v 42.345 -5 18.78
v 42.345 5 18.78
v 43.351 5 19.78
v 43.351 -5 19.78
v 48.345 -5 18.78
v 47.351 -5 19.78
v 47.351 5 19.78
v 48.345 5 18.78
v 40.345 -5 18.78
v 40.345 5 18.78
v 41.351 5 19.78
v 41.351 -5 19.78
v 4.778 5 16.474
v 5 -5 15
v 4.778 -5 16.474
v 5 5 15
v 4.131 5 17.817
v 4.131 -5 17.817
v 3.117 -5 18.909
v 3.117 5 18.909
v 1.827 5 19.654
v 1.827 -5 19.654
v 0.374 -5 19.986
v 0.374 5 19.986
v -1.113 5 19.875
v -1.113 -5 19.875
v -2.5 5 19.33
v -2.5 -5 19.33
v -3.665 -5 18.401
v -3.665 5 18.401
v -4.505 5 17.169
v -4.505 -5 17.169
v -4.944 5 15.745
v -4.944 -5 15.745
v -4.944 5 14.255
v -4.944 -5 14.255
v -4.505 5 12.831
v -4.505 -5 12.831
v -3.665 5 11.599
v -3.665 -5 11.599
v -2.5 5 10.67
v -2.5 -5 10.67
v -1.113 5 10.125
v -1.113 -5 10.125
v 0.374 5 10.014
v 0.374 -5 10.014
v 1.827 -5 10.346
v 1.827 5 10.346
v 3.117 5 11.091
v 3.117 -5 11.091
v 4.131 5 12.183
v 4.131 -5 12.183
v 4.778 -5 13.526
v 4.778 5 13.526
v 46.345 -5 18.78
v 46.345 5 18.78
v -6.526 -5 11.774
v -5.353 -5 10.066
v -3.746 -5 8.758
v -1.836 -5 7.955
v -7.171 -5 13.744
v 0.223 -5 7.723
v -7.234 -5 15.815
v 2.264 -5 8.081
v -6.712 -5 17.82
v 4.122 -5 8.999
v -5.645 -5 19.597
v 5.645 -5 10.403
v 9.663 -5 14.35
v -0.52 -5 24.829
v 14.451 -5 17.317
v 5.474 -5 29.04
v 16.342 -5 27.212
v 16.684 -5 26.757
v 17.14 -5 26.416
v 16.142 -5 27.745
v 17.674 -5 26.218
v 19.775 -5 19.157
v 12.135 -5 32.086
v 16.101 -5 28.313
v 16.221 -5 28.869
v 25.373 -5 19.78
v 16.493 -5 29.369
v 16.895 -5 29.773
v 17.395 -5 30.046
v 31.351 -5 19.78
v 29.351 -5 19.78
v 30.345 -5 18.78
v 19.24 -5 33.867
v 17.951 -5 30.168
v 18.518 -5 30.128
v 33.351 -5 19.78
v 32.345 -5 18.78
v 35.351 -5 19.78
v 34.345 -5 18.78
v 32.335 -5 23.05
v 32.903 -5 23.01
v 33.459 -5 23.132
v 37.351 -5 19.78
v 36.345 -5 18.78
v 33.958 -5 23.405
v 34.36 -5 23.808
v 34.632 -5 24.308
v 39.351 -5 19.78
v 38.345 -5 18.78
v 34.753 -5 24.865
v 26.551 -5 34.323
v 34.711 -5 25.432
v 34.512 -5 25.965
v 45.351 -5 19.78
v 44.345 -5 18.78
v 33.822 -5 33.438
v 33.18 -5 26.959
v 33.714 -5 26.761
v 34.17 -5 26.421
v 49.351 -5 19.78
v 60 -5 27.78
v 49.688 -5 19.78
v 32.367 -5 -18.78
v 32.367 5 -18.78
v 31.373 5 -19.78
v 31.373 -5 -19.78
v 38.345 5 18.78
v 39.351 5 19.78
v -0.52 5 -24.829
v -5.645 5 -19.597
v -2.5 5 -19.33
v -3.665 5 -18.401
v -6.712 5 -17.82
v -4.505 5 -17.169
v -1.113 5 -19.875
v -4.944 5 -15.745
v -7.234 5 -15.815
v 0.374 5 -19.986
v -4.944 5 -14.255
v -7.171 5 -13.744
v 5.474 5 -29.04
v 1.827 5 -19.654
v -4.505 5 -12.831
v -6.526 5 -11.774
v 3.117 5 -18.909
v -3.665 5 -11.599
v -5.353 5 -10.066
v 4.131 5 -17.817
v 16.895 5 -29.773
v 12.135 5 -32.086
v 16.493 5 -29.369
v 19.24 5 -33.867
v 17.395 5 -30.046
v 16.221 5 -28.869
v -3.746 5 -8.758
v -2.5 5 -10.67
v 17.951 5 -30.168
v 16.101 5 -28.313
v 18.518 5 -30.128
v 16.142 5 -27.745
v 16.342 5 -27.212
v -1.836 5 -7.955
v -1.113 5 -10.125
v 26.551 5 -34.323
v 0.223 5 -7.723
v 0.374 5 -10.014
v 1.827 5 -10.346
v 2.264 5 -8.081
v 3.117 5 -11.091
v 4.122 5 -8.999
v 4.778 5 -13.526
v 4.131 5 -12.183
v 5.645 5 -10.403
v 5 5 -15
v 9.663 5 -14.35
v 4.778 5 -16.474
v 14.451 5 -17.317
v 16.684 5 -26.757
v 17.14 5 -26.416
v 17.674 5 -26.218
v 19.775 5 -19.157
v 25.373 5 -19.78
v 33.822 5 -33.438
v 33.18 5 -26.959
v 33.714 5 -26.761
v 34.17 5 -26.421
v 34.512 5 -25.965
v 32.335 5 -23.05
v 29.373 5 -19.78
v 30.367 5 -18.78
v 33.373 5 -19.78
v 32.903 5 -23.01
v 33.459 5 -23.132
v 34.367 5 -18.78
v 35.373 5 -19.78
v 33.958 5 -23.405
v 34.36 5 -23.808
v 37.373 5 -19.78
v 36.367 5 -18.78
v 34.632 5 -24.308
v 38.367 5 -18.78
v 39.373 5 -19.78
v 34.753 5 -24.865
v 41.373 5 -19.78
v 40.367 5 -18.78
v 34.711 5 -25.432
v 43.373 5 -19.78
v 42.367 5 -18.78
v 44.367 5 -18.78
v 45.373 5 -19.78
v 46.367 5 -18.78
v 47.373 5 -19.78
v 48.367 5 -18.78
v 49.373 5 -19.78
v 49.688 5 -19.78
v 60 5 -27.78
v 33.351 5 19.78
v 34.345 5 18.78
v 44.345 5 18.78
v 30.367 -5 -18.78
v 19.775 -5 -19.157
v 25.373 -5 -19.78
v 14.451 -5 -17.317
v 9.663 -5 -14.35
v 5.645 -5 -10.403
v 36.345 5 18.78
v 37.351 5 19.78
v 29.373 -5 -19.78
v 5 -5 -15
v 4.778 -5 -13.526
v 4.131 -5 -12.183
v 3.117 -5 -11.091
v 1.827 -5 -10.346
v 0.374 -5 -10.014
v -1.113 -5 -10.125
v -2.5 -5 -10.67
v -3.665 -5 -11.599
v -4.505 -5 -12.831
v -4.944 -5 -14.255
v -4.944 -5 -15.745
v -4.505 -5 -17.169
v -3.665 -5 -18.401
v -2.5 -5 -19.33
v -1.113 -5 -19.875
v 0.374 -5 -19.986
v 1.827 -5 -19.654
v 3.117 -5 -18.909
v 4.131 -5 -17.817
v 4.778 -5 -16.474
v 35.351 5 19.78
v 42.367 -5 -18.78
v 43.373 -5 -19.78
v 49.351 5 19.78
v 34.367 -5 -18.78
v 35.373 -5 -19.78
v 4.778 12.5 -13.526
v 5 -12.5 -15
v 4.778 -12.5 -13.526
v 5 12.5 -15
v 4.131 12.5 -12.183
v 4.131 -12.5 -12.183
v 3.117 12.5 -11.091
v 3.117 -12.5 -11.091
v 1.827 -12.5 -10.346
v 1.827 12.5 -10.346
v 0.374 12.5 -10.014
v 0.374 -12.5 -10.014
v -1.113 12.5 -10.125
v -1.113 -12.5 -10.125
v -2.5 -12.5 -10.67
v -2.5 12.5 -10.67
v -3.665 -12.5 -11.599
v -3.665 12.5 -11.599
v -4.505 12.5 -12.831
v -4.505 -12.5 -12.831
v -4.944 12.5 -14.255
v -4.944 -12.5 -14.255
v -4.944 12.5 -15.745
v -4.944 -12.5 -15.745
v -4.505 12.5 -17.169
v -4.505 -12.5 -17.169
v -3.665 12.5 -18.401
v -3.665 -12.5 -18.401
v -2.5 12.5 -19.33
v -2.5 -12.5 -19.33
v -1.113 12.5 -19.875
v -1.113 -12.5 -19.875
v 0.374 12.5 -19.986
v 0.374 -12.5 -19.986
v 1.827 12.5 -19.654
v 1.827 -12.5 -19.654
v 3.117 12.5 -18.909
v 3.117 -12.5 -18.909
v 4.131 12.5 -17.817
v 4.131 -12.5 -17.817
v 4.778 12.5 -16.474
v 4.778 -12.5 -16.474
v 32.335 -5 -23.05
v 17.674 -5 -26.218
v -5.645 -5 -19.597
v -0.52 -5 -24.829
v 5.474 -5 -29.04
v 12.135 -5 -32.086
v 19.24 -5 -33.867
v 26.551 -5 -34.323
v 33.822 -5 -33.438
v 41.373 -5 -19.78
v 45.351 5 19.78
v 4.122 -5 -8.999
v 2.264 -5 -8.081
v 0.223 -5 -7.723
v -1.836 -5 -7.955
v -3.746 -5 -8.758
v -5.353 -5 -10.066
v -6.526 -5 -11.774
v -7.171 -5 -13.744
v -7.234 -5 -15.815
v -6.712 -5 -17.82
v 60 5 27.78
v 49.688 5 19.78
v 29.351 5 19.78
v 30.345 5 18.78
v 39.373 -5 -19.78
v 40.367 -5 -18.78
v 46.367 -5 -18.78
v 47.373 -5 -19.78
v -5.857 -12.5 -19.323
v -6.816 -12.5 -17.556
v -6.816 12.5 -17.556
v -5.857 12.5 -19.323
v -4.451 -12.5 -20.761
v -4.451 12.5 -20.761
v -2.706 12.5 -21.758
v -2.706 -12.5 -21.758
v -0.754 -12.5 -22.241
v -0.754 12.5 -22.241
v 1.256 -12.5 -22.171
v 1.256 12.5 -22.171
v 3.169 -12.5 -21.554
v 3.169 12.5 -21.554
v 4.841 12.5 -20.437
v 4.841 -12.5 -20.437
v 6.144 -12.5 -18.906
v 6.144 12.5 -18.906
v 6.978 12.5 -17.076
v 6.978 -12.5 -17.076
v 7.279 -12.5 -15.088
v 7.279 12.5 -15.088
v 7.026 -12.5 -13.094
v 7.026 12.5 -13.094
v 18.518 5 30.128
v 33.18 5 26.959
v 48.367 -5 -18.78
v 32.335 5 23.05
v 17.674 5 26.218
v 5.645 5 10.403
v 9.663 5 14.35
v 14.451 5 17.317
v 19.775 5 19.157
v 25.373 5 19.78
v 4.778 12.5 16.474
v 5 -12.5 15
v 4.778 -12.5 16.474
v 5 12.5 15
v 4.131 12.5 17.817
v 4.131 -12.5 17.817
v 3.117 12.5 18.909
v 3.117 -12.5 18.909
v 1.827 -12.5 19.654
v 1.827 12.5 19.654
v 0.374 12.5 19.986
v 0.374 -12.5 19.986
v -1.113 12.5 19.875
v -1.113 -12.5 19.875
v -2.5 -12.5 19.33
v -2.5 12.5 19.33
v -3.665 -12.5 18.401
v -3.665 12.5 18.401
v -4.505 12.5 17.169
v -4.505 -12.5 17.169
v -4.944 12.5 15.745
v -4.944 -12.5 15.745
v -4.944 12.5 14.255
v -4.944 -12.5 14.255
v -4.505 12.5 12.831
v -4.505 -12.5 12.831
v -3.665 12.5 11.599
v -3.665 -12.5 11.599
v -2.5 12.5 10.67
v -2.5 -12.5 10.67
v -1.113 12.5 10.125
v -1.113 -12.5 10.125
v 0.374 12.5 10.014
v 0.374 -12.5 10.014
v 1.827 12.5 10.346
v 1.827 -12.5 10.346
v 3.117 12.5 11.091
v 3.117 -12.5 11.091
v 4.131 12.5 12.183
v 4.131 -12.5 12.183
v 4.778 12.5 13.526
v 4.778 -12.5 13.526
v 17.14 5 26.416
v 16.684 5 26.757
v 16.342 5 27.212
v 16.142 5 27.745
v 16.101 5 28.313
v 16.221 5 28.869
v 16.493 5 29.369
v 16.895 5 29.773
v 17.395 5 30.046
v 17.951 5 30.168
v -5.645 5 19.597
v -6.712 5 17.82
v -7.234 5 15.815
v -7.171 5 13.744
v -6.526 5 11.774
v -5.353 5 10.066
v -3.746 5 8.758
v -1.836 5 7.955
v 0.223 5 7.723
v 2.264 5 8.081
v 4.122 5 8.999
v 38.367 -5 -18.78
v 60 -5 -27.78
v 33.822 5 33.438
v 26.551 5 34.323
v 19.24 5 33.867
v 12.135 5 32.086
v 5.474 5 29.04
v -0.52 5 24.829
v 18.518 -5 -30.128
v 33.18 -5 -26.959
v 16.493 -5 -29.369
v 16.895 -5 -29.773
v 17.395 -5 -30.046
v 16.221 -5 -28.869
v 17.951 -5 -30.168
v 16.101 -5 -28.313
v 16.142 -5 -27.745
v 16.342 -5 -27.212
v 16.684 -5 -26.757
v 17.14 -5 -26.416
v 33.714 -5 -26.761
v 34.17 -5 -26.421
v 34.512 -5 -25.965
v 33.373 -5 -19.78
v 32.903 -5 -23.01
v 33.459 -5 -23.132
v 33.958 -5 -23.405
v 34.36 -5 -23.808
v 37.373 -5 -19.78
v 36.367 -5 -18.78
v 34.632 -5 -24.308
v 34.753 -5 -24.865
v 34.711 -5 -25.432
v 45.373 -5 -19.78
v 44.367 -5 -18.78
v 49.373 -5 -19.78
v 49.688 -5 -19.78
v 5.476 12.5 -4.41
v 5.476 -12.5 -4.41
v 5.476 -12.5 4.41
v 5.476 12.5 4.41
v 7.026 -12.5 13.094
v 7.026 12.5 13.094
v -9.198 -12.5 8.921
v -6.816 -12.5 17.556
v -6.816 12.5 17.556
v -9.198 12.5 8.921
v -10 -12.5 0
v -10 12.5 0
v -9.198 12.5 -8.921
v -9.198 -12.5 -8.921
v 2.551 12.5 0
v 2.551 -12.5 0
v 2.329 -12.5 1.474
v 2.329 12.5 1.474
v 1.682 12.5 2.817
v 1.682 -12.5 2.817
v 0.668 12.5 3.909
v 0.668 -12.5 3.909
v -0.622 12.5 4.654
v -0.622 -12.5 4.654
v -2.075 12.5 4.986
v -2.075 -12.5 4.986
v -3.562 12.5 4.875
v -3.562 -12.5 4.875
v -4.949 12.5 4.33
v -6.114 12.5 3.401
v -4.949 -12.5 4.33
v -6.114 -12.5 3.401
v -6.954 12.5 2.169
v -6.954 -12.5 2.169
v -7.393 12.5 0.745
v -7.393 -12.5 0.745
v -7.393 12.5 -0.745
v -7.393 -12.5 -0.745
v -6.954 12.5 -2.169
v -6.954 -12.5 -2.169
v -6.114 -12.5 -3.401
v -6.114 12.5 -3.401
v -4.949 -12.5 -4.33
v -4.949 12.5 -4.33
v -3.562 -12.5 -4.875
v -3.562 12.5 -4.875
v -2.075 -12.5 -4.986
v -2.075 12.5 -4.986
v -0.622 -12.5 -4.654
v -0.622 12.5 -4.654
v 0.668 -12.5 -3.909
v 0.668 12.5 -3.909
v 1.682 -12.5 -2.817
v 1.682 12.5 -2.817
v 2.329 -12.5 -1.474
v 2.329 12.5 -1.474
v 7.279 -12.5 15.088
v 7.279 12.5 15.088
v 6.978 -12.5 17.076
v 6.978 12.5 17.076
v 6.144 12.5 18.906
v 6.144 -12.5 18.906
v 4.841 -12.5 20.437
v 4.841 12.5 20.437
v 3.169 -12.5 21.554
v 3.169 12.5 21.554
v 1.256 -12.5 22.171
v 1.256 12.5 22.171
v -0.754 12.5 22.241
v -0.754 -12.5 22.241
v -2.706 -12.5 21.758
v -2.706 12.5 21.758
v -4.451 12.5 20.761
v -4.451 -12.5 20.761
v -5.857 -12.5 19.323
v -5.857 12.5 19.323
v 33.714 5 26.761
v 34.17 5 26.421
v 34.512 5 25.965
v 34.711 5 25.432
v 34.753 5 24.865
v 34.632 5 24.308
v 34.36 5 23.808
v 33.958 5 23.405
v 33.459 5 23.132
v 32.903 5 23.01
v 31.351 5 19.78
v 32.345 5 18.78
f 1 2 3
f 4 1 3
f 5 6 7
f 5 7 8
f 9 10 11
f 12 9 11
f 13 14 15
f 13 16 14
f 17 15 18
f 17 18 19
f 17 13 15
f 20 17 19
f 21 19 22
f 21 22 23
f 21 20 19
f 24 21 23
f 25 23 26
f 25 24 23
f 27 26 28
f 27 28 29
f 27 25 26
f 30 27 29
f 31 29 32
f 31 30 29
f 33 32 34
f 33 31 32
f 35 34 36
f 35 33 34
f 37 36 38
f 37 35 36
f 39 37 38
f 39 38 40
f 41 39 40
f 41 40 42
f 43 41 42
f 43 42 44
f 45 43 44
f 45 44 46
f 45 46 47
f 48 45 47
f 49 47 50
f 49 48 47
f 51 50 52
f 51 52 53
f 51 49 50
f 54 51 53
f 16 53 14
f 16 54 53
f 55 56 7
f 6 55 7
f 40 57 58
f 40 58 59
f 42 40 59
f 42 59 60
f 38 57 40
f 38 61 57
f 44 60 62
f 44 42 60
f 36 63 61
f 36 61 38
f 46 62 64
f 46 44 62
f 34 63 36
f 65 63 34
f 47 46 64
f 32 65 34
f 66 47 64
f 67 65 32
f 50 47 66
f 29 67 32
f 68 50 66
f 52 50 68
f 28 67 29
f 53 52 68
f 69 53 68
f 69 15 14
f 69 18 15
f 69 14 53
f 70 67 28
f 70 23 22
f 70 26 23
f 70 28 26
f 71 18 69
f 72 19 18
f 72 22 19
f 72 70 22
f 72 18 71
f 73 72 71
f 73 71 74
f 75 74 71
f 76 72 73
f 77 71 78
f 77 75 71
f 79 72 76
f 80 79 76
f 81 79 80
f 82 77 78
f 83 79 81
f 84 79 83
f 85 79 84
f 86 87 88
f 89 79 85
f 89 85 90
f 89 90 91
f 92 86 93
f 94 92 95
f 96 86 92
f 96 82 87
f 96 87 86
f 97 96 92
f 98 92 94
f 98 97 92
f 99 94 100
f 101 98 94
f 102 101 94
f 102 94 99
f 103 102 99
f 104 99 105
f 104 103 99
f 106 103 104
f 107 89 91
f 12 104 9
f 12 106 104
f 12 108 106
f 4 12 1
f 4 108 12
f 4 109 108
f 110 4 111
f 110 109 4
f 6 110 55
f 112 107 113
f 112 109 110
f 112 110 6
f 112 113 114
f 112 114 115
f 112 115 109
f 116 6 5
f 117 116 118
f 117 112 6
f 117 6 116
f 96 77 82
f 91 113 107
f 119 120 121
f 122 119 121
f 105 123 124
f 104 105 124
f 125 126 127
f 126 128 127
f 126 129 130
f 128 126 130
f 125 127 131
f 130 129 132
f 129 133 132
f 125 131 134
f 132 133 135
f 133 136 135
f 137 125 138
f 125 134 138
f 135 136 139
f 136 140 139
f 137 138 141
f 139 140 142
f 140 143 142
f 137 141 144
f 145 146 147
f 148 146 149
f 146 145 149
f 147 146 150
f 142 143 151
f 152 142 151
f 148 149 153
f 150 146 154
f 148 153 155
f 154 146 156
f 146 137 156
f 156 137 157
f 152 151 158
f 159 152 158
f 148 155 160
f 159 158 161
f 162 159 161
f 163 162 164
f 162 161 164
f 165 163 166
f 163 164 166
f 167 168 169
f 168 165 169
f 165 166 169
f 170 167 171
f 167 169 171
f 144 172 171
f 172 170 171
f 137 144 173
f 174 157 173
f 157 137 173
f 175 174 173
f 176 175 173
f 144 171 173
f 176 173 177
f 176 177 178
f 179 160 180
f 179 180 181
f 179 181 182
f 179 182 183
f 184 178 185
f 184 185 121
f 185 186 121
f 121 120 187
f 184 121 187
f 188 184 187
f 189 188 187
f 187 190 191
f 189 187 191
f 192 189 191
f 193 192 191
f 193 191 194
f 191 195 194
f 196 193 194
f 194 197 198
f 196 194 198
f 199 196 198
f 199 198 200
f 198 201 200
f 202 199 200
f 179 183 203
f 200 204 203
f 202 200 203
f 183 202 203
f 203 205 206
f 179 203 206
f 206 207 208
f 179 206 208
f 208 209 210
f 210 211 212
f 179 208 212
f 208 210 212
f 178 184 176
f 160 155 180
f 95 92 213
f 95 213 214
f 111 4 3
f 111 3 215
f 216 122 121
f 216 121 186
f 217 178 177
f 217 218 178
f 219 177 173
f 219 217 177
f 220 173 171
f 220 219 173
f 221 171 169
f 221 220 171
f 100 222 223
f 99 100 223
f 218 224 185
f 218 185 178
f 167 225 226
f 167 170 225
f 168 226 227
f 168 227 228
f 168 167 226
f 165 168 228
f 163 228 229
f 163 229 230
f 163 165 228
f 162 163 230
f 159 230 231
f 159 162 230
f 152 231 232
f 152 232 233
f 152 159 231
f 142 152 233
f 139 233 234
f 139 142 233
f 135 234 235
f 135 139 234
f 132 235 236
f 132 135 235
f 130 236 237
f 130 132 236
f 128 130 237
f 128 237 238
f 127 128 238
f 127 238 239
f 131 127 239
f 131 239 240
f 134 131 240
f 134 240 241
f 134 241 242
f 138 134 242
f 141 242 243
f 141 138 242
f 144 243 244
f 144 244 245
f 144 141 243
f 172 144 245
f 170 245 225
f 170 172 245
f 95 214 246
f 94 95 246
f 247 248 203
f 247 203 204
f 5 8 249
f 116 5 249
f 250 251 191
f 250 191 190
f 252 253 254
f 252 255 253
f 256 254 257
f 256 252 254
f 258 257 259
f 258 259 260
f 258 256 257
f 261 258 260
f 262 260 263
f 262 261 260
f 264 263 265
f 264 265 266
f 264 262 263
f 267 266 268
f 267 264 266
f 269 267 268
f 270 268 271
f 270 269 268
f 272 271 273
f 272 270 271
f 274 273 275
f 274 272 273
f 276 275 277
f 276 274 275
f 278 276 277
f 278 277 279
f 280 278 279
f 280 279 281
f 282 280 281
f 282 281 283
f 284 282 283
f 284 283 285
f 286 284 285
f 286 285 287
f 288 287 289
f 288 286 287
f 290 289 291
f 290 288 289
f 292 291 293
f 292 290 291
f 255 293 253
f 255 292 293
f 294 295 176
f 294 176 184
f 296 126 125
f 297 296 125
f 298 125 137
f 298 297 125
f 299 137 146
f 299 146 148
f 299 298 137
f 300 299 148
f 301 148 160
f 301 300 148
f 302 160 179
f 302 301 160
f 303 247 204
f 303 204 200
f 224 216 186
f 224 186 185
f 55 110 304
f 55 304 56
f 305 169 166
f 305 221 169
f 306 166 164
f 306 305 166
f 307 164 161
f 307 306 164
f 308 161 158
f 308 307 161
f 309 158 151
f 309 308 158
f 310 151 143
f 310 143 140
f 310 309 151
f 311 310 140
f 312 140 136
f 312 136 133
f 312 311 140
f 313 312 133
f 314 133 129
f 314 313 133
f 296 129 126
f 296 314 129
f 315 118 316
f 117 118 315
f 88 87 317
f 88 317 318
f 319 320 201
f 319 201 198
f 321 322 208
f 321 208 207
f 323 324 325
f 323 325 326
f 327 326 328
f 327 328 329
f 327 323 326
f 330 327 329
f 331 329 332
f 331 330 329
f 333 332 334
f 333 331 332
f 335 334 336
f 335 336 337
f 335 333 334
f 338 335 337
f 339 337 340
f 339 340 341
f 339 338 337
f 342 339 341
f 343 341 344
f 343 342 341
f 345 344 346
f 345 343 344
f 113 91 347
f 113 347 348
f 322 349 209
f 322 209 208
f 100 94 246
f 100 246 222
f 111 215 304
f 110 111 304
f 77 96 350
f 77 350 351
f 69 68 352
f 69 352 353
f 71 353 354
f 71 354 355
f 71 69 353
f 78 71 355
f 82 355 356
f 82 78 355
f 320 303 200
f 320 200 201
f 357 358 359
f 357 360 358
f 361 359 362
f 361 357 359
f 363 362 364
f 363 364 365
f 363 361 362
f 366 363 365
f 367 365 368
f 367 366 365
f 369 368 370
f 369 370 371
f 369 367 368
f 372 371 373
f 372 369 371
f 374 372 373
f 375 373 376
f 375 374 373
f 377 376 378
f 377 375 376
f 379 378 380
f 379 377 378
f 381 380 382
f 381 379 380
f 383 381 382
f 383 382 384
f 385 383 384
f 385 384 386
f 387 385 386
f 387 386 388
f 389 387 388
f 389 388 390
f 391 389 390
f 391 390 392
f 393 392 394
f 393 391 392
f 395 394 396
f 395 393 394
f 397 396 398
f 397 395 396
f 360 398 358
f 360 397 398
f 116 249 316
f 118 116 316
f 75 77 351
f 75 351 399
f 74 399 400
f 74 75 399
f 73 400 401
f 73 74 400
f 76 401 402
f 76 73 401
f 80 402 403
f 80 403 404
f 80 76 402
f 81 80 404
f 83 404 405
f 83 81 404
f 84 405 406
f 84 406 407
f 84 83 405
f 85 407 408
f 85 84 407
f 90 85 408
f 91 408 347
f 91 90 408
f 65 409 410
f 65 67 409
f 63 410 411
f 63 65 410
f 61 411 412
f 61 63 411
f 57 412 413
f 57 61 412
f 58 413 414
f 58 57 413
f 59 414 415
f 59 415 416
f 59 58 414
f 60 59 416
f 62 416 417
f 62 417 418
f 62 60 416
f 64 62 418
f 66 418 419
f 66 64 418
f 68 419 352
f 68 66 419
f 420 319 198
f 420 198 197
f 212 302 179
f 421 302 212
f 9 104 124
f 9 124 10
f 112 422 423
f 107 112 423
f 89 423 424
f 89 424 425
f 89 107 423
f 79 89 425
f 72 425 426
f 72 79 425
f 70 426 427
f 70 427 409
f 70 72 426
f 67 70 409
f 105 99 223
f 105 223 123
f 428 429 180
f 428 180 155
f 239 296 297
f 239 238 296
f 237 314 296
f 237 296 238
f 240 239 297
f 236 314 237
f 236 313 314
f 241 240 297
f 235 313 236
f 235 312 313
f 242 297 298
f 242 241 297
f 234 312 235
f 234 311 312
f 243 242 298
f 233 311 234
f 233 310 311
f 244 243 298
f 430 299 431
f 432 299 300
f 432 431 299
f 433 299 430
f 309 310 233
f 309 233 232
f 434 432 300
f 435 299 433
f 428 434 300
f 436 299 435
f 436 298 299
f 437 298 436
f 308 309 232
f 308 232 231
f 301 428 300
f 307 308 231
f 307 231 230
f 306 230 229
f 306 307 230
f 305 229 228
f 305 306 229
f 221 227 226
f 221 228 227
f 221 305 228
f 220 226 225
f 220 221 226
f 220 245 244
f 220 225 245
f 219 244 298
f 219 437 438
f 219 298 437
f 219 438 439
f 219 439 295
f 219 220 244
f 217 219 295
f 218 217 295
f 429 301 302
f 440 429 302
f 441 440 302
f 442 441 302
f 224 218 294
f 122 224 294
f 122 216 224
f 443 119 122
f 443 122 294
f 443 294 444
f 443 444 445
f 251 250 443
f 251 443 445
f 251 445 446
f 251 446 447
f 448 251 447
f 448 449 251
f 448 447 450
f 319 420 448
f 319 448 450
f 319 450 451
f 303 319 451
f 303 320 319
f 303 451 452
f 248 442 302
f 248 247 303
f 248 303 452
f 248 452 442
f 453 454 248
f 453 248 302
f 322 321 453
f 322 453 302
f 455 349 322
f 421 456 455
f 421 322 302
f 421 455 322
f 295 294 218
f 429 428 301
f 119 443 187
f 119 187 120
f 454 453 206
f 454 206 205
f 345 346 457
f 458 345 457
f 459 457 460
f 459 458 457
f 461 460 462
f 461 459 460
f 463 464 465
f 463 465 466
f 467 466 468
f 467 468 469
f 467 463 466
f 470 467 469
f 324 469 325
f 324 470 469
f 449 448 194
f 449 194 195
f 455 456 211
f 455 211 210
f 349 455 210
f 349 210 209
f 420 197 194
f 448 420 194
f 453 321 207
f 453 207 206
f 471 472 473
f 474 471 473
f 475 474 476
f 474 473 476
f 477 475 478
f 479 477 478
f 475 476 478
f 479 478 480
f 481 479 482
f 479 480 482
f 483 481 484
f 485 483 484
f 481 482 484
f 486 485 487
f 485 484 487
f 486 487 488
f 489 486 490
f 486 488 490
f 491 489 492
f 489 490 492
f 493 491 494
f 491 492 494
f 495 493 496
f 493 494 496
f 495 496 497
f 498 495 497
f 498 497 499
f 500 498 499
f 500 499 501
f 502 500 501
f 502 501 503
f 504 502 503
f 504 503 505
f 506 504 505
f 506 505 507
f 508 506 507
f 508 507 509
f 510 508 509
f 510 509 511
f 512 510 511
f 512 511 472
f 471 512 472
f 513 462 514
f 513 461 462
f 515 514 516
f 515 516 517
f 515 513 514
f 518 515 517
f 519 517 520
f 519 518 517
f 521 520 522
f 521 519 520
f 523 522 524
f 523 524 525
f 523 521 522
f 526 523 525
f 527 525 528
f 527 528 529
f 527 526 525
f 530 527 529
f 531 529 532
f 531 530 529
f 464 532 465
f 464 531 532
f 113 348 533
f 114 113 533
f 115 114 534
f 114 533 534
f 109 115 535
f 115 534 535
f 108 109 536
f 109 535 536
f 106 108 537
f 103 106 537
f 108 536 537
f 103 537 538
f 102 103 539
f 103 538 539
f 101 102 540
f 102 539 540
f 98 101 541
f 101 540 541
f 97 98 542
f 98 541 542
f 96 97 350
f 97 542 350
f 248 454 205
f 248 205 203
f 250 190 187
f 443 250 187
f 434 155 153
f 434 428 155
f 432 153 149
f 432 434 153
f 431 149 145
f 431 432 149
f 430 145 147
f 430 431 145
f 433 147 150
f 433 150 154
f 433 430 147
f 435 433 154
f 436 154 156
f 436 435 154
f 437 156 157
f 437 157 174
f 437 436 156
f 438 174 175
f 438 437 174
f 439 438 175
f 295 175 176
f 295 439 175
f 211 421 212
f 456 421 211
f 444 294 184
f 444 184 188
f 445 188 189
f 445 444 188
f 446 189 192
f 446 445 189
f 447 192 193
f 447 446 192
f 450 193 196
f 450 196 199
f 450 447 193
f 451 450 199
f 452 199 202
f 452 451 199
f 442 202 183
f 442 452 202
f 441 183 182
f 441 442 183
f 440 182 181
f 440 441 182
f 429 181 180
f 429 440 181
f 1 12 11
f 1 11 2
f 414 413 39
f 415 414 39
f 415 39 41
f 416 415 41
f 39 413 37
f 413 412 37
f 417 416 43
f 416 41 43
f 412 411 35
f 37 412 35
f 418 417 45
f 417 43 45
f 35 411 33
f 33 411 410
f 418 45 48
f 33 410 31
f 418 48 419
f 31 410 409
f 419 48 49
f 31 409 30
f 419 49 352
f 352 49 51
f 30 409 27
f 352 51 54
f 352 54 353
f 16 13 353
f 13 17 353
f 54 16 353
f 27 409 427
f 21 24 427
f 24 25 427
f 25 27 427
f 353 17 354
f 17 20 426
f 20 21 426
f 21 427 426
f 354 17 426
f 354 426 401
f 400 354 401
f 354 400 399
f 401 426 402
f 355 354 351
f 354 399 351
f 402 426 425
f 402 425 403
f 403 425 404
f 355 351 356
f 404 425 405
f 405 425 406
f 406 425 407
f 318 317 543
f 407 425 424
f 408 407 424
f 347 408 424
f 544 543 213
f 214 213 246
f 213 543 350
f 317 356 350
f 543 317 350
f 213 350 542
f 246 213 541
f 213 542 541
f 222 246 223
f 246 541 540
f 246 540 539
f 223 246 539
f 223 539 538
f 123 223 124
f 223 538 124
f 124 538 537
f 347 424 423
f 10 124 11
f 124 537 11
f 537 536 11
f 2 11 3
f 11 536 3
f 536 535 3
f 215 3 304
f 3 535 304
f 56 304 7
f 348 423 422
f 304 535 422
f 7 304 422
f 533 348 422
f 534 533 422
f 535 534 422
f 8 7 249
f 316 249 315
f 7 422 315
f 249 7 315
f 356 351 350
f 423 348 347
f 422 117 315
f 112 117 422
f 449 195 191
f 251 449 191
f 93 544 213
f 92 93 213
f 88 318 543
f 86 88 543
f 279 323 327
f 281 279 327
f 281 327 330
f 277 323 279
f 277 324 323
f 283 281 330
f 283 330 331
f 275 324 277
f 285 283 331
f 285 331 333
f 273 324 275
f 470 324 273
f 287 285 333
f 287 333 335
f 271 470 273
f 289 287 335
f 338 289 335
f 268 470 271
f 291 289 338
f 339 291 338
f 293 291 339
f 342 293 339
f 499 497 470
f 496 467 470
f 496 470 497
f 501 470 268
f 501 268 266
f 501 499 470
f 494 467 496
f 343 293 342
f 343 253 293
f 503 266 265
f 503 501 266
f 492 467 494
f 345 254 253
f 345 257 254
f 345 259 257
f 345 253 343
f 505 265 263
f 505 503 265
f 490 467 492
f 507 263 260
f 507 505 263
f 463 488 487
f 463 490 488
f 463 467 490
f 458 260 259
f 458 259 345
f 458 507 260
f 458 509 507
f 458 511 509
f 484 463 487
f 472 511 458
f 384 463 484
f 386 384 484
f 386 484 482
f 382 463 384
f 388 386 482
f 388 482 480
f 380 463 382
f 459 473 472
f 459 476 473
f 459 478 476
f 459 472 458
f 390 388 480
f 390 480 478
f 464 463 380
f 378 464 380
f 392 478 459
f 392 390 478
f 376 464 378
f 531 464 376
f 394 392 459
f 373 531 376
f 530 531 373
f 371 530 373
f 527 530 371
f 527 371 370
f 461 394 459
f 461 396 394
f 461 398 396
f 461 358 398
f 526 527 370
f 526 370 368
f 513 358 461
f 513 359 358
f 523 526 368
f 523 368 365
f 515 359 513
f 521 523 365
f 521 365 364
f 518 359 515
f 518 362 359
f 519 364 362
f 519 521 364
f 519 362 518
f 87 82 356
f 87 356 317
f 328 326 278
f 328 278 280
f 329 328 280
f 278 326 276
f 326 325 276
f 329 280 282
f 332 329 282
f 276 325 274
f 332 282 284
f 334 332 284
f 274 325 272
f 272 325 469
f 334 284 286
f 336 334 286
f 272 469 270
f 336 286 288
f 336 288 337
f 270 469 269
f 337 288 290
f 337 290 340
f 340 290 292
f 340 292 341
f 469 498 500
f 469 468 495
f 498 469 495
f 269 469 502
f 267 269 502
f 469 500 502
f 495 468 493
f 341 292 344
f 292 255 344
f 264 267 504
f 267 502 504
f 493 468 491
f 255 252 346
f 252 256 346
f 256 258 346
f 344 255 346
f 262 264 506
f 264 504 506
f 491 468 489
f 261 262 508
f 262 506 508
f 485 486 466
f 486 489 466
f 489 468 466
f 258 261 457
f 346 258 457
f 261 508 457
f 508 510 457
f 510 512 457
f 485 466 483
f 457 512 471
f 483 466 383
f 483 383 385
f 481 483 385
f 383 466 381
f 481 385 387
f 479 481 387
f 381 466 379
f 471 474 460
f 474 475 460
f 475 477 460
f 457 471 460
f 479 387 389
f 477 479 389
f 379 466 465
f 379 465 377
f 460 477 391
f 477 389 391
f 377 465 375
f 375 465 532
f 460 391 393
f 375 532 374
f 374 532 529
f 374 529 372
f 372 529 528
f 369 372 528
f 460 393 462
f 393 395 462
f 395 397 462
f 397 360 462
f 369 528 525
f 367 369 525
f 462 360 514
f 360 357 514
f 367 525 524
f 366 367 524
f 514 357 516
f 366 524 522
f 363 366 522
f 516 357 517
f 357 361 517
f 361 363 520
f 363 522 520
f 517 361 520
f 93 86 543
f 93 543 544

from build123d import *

# Parameters (mm, degrees)
F0_R     = 5
F2_DEPTH = 12.5
F1_R     = 5
F3_DEPTH = 5
F4_R     = 5
F5_DEPTH = 25.001


with BuildPart() as f2:
    # F0 (on Front) → F2 (new body, symmetric)
    with BuildSketch(Plane.XZ):
        with BuildLine():
            ThreePointArc((7.0259297591, 13.0935796997), (2.2337529405, 21.928814844), (-6.8164588785, 17.5561720794))
            ThreePointArc((-6.8164588785, 17.5561720794), (-10, 0), (-6.8164588785, -17.5561720794))
            ThreePointArc((-6.8164588785, -17.5561720794), (2.2337529405, -21.928814844), (7.0259297591, -13.0935796997))
            ThreePointArc((7.0259297591, -13.0935796997), (5.2810659691, 0), (7.0259297591, 13.0935796997))
        make_face()
        with Locations((0, -15)):
            Circle(F0_R, mode=Mode.SUBTRACT)
        with Locations((0, 15)):
            Circle(F0_R, mode=Mode.SUBTRACT)
    extrude(amount=F2_DEPTH, both=True)

    # F4 (on face) → F5 (cut, through all)
    with BuildSketch(Plane.XZ.offset(12.5)):
        with Locations((0, -15)):
            Circle(F4_R)
        with Locations((0, 15)):
            Circle(F4_R)
        with Locations((-2.44897563, 0)):
            Circle(F4_R)
    extrude(amount=-F5_DEPTH, mode=Mode.SUBTRACT)


with BuildPart() as f3:
    # F1 (on Front) → F3 (new body, symmetric)
    with BuildSketch(Plane.XZ):
        with BuildLine():
            ThreePointArc((5.6452437418, 10.4033326816), (6.8591324548, 12.5606498184), (7.2799812734, 15))
            ThreePointArc((7.2799812734, 15), (2.4393501816, 21.8591324548), (-5.6452437418, 19.5966673184))
            ThreePointArc((-5.6452437418, 19.5966673184), (-4.5966673184, 9.3547562582), (5.6452437418, 10.4033326816))
        make_face()
        with Locations((0, 15)):
            Circle(F1_R, mode=Mode.SUBTRACT)
        with BuildLine():
            ThreePointArc((-5.6452437418, 19.5966673184), (2.4393501816, 21.8591324548), (7.2799812734, 15))
            ThreePointArc((7.2799812734, 15), (6.8591324548, 12.5606498184), (5.6452437418, 10.4033326816))
            ThreePointArc((5.6452437418, 10.4033326816), (14.451383321, 17.3167254025), (25.372658804, 19.780225966))
            Line((25.372658804, 19.780225966), (29.3511980622, 19.780225966))
            Line((29.3511980622, 19.780225966), (31.3511980622, 19.780225966))
            Line((31.3511980622, 19.780225966), (33.3511980622, 19.780225966))
            Line((33.3511980622, 19.780225966), (35.3511980622, 19.780225966))
            Line((35.3511980622, 19.780225966), (37.3511980622, 19.780225966))
            Line((37.3511980622, 19.780225966), (39.3511980622, 19.780225966))
            Line((39.3511980622, 19.780225966), (41.3511980622, 19.780225966))
            Line((41.3511980622, 19.780225966), (43.3511980622, 19.780225966))
            Line((43.3511980622, 19.780225966), (45.3511980622, 19.780225966))
            Line((45.3511980622, 19.780225966), (47.3511980622, 19.780225966))
            Line((47.3511980622, 19.780225966), (49.3511980622, 19.780225966))
            Line((49.3511980622, 19.780225966), (49.6884021907, 19.780225966))
            Line((49.6884021907, 19.780225966), (60, 27.780225966))
            Line((60, 27.780225966), (33.8220885653, 33.437594267))
            ThreePointArc((33.8220885653, 33.437594267), (12.1353325764, 32.0863564553), (-5.6452437418, 19.5966673184))
        make_face()
        with BuildLine():
            ThreePointArc((17.6735257598, 26.2181881521), (16.1411269602, 28.5955299278), (18.518468736, 30.1279287275))
            Line((18.518468736, 30.1279287275), (33.1799958938, 26.959392567))
            ThreePointArc((33.1799958938, 26.959392567), (34.7123946934, 24.5820507912), (32.3350529176, 23.0496519916))
            Line((32.3350529176, 23.0496519916), (17.6735257598, 26.2181881521))
        make_face(mode=Mode.SUBTRACT)
        Polygon((31.3511980622, 19.780225966), (29.3511980622, 19.780225966), (30.3454212844, 18.7802426517), align=None)
        Polygon((33.3511980622, 19.780225966), (31.3511980622, 19.780225966), (32.3454212844, 18.7802426517), align=None)
        Polygon((48.3454212844, 18.7802426517), (49.3511980622, 19.780225966), (47.3511980622, 19.780225966), align=None)
        Polygon((35.3511980622, 19.780225966), (33.3511980622, 19.780225966), (34.3454212844, 18.7802426517), align=None)
        Polygon((46.3454212844, 18.7802426517), (47.3511980622, 19.780225966), (45.3511980622, 19.780225966), align=None)
        Polygon((37.3511980622, 19.780225966), (35.3511980622, 19.780225966), (36.3454212844, 18.7802426517), align=None)
        Polygon((44.3454212844, 18.7802426517), (45.3511980622, 19.780225966), (43.3511980622, 19.780225966), align=None)
        Polygon((39.3511980622, 19.780225966), (37.3511980622, 19.780225966), (38.3454212844, 18.7802426517), align=None)
        Polygon((42.3454212844, 18.7802426517), (43.3511980622, 19.780225966), (41.3511980622, 19.780225966), align=None)
        Polygon((41.3511980622, 19.780225966), (39.3511980622, 19.780225966), (40.3454212844, 18.7802426517), align=None)
    extrude(amount=F3_DEPTH, both=True)


with BuildPart() as f3b:
    # F1 (on Front) → F3, piece 2 (new body, symmetric)
    with BuildSketch(Plane.XZ):
        with BuildLine():
            ThreePointArc((-5.6452437418, -19.5966673184), (12.1353325764, -32.0863564553), (33.8220885653, -33.437594267))
            Line((33.8220885653, -33.437594267), (60, -27.780225966))
            Line((60, -27.780225966), (49.6884021907, -19.780225966))
            Line((49.6884021907, -19.780225966), (49.3726588903, -19.780225966))
            Line((49.3726588903, -19.780225966), (47.3726588903, -19.780225966))
            Line((47.3726588903, -19.780225966), (45.3726588903, -19.780225966))
            Line((45.3726588903, -19.780225966), (43.3726588903, -19.780225966))
            Line((43.3726588903, -19.780225966), (41.3726588903, -19.780225966))
            Line((41.3726588903, -19.780225966), (39.3726588903, -19.780225966))
            Line((39.3726588903, -19.780225966), (37.3726588903, -19.780225966))
            Line((37.3726588903, -19.780225966), (35.3726588903, -19.780225966))
            Line((35.3726588903, -19.780225966), (33.3726588903, -19.780225966))
            Line((33.3726588903, -19.780225966), (31.3726588903, -19.780225966))
            Line((31.3726588903, -19.780225966), (29.3726588903, -19.780225966))
            Line((29.3726588903, -19.780225966), (25.372658804, -19.780225966))
            ThreePointArc((25.372658804, -19.780225966), (14.451383321, -17.3167254025), (5.6452437418, -10.4033326816))
            ThreePointArc((5.6452437418, -10.4033326816), (6.8591324548, -12.5606498184), (7.2799812734, -15))
            ThreePointArc((7.2799812734, -15), (2.4393501816, -21.8591324548), (-5.6452437418, -19.5966673184))
        make_face()
        with BuildLine():
            Line((17.6735257598, -26.2181881521), (32.3350529176, -23.0496519916))
            ThreePointArc((32.3350529176, -23.0496519916), (34.7123946934, -24.5820507912), (33.1799958938, -26.959392567))
            Line((33.1799958938, -26.959392567), (18.518468736, -30.1279287275))
            ThreePointArc((18.518468736, -30.1279287275), (16.1411269602, -28.5955299278), (17.6735257598, -26.2181881521))
        make_face(mode=Mode.SUBTRACT)
        with BuildLine():
            ThreePointArc((5.6452437418, -10.4033326816), (-4.5966673184, -9.3547562582), (-5.6452437418, -19.5966673184))
            ThreePointArc((-5.6452437418, -19.5966673184), (2.4393501816, -21.8591324548), (7.2799812734, -15))
            ThreePointArc((7.2799812734, -15), (6.8591324548, -12.5606498184), (5.6452437418, -10.4033326816))
        make_face()
        with Locations((0, -15)):
            Circle(F1_R, mode=Mode.SUBTRACT)
        Polygon((47.3726588903, -19.780225966), (49.3726588903, -19.780225966), (48.3668821125, -18.7802427375), align=None)
        Polygon((30.3668821125, -18.7802427375), (29.3726588903, -19.7802260518), (31.3726588903, -19.780225966), align=None)
        Polygon((45.3726588903, -19.780225966), (47.3726588903, -19.780225966), (46.3668821125, -18.7802427375), align=None)
        Polygon((32.3668821125, -18.7802427375), (31.3726588903, -19.7802260518), (33.3726588903, -19.780225966), align=None)
        Polygon((43.3726588903, -19.780225966), (45.3726588903, -19.780225966), (44.3668821125, -18.7802427375), align=None)
        Polygon((34.3668821125, -18.7802427375), (33.3726588903, -19.7802260518), (35.3726588903, -19.780225966), align=None)
        Polygon((41.3726588903, -19.780225966), (43.3726588903, -19.780225966), (42.3668821125, -18.7802427375), align=None)
        Polygon((36.3668821125, -18.7802427375), (35.3726588903, -19.7802260518), (37.3726588903, -19.780225966), align=None)
        Polygon((39.3726588903, -19.780225966), (41.3726588903, -19.780225966), (40.3668821125, -18.7802427375), align=None)
        Polygon((38.3668821125, -18.7802427375), (37.3726588903, -19.7802260518), (39.3726588903, -19.780225966), align=None)
    extrude(amount=F3_DEPTH, both=True)


solid = Compound([f2.part, f3.part, f3b.part])
